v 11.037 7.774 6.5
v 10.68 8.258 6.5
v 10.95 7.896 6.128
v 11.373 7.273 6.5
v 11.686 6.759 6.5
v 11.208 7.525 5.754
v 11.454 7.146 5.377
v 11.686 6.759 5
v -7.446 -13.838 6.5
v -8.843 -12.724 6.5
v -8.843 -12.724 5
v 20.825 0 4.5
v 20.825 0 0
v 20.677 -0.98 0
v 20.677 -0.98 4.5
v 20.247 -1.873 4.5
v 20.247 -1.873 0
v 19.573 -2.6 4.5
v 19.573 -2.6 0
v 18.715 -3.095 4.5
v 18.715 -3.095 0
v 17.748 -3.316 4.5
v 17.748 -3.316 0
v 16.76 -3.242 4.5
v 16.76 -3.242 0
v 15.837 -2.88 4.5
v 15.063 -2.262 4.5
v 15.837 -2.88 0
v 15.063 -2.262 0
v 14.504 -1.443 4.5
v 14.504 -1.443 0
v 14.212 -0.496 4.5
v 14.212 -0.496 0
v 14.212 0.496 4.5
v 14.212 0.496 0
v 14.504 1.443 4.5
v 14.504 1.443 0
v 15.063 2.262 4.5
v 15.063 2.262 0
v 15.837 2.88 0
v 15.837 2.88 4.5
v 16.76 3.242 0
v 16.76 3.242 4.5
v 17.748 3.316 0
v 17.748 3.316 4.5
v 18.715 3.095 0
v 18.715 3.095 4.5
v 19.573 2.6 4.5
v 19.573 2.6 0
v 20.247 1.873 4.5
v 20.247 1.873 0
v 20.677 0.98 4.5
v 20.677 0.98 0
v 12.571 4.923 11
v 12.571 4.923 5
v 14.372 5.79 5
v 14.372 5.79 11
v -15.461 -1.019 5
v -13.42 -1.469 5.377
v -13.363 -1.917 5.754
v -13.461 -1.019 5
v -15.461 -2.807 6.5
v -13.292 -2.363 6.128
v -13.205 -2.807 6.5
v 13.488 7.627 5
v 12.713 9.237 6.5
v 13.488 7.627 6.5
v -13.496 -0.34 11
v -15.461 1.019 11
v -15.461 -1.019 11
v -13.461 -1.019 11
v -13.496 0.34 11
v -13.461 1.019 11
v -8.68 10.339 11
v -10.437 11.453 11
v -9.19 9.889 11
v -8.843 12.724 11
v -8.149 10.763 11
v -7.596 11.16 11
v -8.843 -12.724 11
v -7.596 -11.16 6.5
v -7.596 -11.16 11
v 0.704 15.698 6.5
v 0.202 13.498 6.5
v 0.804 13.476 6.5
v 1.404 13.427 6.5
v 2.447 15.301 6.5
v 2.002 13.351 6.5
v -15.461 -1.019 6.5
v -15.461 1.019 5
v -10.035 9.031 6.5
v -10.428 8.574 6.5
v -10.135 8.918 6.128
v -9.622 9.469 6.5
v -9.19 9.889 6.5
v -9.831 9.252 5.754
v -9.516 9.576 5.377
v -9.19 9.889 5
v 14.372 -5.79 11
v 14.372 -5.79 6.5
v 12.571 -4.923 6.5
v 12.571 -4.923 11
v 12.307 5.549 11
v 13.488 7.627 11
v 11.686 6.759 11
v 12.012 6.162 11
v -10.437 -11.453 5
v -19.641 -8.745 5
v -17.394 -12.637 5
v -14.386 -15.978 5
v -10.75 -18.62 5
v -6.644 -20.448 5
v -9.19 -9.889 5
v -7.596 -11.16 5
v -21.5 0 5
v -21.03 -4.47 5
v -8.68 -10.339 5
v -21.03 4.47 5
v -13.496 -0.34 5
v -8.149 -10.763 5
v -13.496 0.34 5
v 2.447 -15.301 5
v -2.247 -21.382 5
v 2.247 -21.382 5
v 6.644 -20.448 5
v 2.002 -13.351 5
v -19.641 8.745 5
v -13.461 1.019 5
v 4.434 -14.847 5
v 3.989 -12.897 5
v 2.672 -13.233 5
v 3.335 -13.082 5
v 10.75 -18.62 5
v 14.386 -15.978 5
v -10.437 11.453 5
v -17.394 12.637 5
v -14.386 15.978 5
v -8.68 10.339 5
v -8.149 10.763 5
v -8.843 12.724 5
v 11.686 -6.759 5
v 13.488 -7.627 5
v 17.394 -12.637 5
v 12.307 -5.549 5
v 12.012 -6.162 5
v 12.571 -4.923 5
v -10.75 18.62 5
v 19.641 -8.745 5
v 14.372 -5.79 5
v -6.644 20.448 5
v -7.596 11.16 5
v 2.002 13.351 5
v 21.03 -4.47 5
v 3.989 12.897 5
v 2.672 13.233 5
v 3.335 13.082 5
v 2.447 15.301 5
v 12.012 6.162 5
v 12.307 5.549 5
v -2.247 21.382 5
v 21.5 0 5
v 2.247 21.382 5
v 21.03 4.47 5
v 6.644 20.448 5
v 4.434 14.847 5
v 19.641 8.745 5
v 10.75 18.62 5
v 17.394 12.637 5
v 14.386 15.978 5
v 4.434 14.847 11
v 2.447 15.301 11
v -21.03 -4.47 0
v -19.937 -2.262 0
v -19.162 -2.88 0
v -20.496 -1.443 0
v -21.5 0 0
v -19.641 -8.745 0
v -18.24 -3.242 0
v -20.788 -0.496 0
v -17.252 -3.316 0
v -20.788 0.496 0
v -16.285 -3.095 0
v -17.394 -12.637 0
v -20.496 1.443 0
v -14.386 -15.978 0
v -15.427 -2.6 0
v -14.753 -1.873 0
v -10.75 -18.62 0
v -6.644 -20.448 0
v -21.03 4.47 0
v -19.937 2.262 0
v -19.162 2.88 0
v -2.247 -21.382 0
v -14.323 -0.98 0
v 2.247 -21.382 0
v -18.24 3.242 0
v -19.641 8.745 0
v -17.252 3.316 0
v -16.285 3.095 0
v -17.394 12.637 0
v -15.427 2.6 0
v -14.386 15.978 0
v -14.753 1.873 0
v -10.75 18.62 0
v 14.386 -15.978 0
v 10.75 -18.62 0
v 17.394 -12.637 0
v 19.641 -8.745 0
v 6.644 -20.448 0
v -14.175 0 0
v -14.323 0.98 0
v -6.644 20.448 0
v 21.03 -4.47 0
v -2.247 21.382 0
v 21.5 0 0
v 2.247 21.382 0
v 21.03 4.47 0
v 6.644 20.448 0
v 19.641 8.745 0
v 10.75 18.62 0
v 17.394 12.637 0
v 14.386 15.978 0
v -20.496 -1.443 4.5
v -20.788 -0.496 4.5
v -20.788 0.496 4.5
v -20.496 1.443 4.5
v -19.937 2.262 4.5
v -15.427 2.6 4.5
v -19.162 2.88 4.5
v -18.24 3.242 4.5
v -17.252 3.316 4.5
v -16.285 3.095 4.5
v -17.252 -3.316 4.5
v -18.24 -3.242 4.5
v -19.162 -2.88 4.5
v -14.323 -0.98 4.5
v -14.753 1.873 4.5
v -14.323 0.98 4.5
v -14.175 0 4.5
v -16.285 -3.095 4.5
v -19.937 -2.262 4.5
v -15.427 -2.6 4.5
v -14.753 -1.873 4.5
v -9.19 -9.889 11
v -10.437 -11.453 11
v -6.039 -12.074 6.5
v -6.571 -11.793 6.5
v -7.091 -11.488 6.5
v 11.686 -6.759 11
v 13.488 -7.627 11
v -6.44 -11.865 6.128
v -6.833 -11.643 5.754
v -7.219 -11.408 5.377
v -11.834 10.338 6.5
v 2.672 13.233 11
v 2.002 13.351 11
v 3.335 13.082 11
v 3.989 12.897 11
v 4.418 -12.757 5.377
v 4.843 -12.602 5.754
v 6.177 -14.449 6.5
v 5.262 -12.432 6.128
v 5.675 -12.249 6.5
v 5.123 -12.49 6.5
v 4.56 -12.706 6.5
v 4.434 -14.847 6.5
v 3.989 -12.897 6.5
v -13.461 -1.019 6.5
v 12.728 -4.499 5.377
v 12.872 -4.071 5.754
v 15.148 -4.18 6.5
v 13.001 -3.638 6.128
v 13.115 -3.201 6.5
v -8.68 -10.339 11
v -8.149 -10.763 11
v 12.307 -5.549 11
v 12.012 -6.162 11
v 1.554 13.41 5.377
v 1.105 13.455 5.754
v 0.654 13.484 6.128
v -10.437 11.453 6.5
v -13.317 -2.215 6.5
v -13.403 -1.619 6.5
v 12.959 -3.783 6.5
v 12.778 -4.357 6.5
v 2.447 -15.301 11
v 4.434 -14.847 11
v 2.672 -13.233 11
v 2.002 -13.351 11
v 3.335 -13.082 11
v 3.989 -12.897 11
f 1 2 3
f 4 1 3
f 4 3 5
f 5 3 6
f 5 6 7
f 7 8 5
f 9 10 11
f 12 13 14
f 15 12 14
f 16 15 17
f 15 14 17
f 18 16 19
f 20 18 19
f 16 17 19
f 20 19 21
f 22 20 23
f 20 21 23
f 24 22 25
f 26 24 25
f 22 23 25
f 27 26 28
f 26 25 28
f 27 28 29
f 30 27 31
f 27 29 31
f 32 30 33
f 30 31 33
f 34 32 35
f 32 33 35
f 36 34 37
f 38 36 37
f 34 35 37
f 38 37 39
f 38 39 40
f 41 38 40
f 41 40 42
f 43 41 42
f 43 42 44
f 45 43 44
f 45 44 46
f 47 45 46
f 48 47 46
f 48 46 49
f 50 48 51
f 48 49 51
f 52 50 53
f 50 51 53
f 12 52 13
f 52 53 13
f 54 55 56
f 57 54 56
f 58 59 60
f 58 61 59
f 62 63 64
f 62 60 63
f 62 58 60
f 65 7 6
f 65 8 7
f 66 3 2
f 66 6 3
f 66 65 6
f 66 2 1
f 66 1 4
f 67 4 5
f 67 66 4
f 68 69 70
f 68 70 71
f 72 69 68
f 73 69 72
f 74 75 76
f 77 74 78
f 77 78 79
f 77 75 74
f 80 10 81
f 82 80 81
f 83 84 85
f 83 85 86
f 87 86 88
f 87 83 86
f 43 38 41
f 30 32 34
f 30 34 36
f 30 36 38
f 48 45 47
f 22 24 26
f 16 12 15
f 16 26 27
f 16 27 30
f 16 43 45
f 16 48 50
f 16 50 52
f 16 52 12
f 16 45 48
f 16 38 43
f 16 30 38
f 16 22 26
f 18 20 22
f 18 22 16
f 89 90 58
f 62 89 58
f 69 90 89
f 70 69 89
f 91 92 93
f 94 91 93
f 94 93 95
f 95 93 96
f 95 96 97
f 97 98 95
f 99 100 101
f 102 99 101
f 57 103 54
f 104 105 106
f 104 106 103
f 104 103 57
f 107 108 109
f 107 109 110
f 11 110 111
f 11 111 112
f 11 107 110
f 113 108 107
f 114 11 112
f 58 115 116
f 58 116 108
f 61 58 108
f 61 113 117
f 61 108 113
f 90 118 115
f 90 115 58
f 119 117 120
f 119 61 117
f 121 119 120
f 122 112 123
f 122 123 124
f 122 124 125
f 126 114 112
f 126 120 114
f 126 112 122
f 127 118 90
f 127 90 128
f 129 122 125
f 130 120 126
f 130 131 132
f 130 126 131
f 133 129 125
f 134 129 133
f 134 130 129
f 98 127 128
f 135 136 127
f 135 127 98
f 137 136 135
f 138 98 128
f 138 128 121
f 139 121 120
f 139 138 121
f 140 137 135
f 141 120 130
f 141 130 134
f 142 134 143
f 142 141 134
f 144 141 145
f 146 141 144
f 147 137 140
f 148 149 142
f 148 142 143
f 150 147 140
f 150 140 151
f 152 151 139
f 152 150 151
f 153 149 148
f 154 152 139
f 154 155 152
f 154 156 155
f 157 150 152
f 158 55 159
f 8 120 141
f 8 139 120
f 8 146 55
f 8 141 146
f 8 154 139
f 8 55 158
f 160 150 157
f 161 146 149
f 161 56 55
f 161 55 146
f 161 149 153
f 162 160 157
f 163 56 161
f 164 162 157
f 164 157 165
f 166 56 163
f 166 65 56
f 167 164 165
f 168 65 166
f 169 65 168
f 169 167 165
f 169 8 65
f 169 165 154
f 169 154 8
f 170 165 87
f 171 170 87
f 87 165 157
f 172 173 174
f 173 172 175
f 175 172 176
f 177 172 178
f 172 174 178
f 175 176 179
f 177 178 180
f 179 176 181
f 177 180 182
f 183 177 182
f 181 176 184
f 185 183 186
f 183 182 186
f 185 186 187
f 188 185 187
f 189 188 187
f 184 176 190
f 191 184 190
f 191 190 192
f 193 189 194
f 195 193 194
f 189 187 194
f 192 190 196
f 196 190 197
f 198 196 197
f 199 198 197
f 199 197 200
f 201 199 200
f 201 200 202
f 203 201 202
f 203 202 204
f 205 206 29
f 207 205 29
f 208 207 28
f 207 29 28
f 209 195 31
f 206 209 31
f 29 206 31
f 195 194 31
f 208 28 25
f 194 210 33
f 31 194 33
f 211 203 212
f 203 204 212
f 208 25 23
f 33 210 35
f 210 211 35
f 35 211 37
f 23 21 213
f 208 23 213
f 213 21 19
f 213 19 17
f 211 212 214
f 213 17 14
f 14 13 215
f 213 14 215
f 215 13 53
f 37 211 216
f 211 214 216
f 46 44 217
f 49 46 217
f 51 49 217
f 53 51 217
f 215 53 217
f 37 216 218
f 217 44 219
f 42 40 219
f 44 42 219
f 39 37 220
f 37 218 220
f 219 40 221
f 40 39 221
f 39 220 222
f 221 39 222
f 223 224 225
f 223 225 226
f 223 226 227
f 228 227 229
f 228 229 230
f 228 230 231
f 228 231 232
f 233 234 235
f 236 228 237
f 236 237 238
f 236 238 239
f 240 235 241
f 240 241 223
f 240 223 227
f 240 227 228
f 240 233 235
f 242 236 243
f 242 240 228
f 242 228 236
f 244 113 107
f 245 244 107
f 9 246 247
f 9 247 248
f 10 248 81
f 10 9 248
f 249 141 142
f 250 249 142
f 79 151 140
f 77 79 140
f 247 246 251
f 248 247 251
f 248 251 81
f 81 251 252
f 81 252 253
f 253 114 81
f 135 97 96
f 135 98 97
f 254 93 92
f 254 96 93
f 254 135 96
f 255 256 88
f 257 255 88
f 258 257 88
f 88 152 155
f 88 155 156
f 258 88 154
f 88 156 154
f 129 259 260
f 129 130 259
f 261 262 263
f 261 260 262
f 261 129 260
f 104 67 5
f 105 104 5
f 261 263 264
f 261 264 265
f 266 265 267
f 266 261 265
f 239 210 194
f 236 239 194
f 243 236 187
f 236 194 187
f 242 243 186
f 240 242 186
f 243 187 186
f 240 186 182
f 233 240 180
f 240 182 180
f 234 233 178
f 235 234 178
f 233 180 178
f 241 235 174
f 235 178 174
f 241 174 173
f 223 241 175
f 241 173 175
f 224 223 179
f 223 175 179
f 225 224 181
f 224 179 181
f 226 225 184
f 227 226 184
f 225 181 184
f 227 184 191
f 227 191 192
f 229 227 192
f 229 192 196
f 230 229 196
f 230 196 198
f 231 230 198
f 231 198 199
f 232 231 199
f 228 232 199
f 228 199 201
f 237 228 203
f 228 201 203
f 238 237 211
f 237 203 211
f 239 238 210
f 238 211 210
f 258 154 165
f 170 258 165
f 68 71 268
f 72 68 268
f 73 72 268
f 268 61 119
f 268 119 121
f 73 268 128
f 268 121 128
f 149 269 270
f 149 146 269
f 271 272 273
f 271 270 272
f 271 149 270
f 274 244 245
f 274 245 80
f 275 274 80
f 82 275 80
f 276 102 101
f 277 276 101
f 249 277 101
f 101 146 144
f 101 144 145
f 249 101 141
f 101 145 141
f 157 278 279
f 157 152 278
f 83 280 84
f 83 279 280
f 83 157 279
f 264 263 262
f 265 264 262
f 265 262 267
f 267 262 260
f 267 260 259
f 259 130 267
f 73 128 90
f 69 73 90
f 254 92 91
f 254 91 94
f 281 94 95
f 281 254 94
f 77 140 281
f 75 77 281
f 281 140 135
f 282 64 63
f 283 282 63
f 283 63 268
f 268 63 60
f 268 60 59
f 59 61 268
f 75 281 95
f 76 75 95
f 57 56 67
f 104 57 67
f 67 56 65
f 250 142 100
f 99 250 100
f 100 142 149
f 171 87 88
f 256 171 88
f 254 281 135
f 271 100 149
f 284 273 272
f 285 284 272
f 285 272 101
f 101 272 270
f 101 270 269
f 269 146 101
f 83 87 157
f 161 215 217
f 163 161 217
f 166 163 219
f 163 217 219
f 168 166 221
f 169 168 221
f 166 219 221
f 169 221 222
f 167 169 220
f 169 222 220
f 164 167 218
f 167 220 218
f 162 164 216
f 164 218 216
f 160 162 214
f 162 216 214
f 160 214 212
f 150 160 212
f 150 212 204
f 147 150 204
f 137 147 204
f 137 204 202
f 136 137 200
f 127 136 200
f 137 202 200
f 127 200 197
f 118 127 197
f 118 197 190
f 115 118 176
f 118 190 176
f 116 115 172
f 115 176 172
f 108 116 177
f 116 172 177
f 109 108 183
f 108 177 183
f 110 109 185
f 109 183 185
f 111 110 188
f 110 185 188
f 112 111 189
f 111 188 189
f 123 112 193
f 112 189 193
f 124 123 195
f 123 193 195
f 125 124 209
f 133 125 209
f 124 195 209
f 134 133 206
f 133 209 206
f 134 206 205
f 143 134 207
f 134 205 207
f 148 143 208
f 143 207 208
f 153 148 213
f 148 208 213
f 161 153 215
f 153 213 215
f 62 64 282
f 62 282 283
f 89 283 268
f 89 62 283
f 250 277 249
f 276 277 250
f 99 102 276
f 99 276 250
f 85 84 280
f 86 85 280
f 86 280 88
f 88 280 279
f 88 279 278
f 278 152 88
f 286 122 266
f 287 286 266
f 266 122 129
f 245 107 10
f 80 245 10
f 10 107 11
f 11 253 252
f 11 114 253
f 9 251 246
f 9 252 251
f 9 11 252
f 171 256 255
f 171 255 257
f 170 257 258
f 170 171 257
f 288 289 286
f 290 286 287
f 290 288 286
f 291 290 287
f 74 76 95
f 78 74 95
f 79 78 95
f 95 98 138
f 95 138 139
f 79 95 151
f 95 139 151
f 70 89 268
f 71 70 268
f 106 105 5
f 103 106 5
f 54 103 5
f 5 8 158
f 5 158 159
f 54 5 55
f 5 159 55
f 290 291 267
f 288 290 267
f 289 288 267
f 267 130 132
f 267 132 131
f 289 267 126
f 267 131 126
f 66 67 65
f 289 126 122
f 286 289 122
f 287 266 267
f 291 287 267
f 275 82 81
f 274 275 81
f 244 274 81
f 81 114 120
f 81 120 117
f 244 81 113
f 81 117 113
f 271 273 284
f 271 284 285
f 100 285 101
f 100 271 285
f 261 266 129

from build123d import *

# Parameters (mm, degrees)
F0_R            = 21.5
F0_R_2          = 13.5
F1_DEPTH        = 5
F3_DEPTH        = 6
F4_R            = 3.325
F5_DEPTH        = 4.5
F7_END_RADIUS   = 13.5
F7_REACH        = 39.2960714607
F7_COPIES_COUNT = 7


# Not quite as in the source:
# - a pattern or mirror of a feature is missing from the dataset's text; its kind, count and spacing are read off the source's solid


with BuildPart() as f1:
    # F0 (on Top) → F1 (new body)
    with BuildSketch(Plane.XY):
        Circle(F0_R)
        Circle(F0_R_2, mode=Mode.SUBTRACT)
        Circle(F0_R_2)
    extrude(amount=F1_DEPTH)

    # F2 (on face) → F3 (join)
    with BuildSketch(Plane.XY.offset(5)):
        with BuildLine():
            ThreePointArc((-13.4614857204, -1.0190202158), (-13.5, 0), (-13.4614857204, 1.0190202158))
            Line((-13.4614857204, 1.0190202158), (-15.4614857204, 1.0190202158))
            Line((-15.4614857204, 1.0190202158), (-15.4614857204, -1.0190202158))
            Line((-15.4614857204, -1.0190202158), (-13.4614857204, -1.0190202158))
        make_face()
        with BuildLine():
            ThreePointArc((-7.5963969786, -11.1599620494), (-8.4171123251, -10.5547250133), (-9.1898011505, -9.8892646246))
            Line((-9.1898011505, -9.8892646246), (-10.4367807542, -11.4529275895))
            Line((-10.4367807542, -11.4529275895), (-8.8433765823, -12.7236250143))
            Line((-8.8433765823, -12.7236250143), (-7.5963969786, -11.1599620494))
        make_face()
        with BuildLine():
            ThreePointArc((3.9889336264, -12.8972248381), (3.0040326084, -13.1615268145), (2.0019911235, -13.3507314984))
            Line((2.0019911235, -13.3507314984), (2.4470329914, -15.3005873227))
            Line((2.4470329914, -15.3005873227), (4.4339754943, -14.8470806625))
            Line((4.4339754943, -14.8470806625), (3.9889336264, -12.8972248381))
        make_face()
        with BuildLine():
            ThreePointArc((12.5705158512, -4.9226142683), (12.1630797167, -5.8574304781), (11.6862432483, -6.7588252486))
            Line((11.6862432483, -6.7588252486), (13.4881809841, -7.6265927268))
            Line((13.4881809841, -7.6265927268), (14.372453587, -5.7903817465))
            Line((14.372453587, -5.7903817465), (12.5705158512, -4.9226142683))
        make_face()
        with BuildLine():
            ThreePointArc((11.6862432483, 6.7588252486), (12.1630797167, 5.8574304781), (12.5705158512, 4.9226142683))
            Line((12.5705158512, 4.9226142683), (14.372453587, 5.7903817465))
            Line((14.372453587, 5.7903817465), (13.4881809841, 7.6265927268))
            Line((13.4881809841, 7.6265927268), (11.6862432483, 6.7588252486))
        make_face()
        with BuildLine():
            ThreePointArc((2.0019911235, 13.3507314984), (3.0040326084, 13.1615268145), (3.9889336264, 12.8972248381))
            Line((3.9889336264, 12.8972248381), (4.4339754943, 14.8470806625))
            Line((4.4339754943, 14.8470806625), (2.4470329914, 15.3005873227))
            Line((2.4470329914, 15.3005873227), (2.0019911235, 13.3507314984))
        make_face()
        with BuildLine():
            ThreePointArc((-9.1898011505, 9.8892646246), (-8.4171123251, 10.5547250133), (-7.5963969786, 11.1599620494))
            Line((-7.5963969786, 11.1599620494), (-8.8433765823, 12.7236250143))
            Line((-8.8433765823, 12.7236250143), (-10.4367807542, 11.4529275895))
            Line((-10.4367807542, 11.4529275895), (-9.1898011505, 9.8892646246))
        make_face()
    extrude(amount=F3_DEPTH)

    # F4 (on face) → F5 (cut)
    with BuildSketch(Plane(origin=(0, 0, 0), x_dir=(1, 0, 0), z_dir=(0, 0, -1))):
        with Locations((-17.5, 0)):
            Circle(F4_R)
        with Locations((17.5, 0)):
            Circle(F4_R)
    extrude(amount=-F5_DEPTH, mode=Mode.SUBTRACT)

    f7_end = (Plane(origin=(0, 0, 8), x_dir=(-1, 0, 0), z_dir=(0, 0, -1)) * Cylinder(F7_END_RADIUS, 202.1882593652, mode=Mode.PRIVATE)).faces().sort_by_distance((-13.5, 0, 8))[0]
    # F6 (on face) → F7 (join, up to the whole of a round face its end follows)
    with BuildSketch(Plane(origin=(-15.4614857204, 0, 0), x_dir=(0, -1, 0), z_dir=(-1, 0, 0))):
        Polygon((1.0190202158, 6.5), (1.0190202158, 5), (2.8066506047, 6.5), align=None)
    f7_long = extrude(amount=-F7_REACH, mode=Mode.PRIVATE)
    f7 = split(f7_long, bisect_by=f7_end, keep=Keep.ALL, mode=Mode.PRIVATE).solids().sort_by_distance((-15.4614857204, -1.6148970121, 6))[0]
    add(f7)

    # F7_copies: F7 ×7 about axis
    f7_copies_axis = Axis((0, 0, 0), (0, 0, 1))
    for i in range(1, F7_COPIES_COUNT):
        add(f7.rotate(f7_copies_axis, i * 360 / F7_COPIES_COUNT))


solid = f1.part
